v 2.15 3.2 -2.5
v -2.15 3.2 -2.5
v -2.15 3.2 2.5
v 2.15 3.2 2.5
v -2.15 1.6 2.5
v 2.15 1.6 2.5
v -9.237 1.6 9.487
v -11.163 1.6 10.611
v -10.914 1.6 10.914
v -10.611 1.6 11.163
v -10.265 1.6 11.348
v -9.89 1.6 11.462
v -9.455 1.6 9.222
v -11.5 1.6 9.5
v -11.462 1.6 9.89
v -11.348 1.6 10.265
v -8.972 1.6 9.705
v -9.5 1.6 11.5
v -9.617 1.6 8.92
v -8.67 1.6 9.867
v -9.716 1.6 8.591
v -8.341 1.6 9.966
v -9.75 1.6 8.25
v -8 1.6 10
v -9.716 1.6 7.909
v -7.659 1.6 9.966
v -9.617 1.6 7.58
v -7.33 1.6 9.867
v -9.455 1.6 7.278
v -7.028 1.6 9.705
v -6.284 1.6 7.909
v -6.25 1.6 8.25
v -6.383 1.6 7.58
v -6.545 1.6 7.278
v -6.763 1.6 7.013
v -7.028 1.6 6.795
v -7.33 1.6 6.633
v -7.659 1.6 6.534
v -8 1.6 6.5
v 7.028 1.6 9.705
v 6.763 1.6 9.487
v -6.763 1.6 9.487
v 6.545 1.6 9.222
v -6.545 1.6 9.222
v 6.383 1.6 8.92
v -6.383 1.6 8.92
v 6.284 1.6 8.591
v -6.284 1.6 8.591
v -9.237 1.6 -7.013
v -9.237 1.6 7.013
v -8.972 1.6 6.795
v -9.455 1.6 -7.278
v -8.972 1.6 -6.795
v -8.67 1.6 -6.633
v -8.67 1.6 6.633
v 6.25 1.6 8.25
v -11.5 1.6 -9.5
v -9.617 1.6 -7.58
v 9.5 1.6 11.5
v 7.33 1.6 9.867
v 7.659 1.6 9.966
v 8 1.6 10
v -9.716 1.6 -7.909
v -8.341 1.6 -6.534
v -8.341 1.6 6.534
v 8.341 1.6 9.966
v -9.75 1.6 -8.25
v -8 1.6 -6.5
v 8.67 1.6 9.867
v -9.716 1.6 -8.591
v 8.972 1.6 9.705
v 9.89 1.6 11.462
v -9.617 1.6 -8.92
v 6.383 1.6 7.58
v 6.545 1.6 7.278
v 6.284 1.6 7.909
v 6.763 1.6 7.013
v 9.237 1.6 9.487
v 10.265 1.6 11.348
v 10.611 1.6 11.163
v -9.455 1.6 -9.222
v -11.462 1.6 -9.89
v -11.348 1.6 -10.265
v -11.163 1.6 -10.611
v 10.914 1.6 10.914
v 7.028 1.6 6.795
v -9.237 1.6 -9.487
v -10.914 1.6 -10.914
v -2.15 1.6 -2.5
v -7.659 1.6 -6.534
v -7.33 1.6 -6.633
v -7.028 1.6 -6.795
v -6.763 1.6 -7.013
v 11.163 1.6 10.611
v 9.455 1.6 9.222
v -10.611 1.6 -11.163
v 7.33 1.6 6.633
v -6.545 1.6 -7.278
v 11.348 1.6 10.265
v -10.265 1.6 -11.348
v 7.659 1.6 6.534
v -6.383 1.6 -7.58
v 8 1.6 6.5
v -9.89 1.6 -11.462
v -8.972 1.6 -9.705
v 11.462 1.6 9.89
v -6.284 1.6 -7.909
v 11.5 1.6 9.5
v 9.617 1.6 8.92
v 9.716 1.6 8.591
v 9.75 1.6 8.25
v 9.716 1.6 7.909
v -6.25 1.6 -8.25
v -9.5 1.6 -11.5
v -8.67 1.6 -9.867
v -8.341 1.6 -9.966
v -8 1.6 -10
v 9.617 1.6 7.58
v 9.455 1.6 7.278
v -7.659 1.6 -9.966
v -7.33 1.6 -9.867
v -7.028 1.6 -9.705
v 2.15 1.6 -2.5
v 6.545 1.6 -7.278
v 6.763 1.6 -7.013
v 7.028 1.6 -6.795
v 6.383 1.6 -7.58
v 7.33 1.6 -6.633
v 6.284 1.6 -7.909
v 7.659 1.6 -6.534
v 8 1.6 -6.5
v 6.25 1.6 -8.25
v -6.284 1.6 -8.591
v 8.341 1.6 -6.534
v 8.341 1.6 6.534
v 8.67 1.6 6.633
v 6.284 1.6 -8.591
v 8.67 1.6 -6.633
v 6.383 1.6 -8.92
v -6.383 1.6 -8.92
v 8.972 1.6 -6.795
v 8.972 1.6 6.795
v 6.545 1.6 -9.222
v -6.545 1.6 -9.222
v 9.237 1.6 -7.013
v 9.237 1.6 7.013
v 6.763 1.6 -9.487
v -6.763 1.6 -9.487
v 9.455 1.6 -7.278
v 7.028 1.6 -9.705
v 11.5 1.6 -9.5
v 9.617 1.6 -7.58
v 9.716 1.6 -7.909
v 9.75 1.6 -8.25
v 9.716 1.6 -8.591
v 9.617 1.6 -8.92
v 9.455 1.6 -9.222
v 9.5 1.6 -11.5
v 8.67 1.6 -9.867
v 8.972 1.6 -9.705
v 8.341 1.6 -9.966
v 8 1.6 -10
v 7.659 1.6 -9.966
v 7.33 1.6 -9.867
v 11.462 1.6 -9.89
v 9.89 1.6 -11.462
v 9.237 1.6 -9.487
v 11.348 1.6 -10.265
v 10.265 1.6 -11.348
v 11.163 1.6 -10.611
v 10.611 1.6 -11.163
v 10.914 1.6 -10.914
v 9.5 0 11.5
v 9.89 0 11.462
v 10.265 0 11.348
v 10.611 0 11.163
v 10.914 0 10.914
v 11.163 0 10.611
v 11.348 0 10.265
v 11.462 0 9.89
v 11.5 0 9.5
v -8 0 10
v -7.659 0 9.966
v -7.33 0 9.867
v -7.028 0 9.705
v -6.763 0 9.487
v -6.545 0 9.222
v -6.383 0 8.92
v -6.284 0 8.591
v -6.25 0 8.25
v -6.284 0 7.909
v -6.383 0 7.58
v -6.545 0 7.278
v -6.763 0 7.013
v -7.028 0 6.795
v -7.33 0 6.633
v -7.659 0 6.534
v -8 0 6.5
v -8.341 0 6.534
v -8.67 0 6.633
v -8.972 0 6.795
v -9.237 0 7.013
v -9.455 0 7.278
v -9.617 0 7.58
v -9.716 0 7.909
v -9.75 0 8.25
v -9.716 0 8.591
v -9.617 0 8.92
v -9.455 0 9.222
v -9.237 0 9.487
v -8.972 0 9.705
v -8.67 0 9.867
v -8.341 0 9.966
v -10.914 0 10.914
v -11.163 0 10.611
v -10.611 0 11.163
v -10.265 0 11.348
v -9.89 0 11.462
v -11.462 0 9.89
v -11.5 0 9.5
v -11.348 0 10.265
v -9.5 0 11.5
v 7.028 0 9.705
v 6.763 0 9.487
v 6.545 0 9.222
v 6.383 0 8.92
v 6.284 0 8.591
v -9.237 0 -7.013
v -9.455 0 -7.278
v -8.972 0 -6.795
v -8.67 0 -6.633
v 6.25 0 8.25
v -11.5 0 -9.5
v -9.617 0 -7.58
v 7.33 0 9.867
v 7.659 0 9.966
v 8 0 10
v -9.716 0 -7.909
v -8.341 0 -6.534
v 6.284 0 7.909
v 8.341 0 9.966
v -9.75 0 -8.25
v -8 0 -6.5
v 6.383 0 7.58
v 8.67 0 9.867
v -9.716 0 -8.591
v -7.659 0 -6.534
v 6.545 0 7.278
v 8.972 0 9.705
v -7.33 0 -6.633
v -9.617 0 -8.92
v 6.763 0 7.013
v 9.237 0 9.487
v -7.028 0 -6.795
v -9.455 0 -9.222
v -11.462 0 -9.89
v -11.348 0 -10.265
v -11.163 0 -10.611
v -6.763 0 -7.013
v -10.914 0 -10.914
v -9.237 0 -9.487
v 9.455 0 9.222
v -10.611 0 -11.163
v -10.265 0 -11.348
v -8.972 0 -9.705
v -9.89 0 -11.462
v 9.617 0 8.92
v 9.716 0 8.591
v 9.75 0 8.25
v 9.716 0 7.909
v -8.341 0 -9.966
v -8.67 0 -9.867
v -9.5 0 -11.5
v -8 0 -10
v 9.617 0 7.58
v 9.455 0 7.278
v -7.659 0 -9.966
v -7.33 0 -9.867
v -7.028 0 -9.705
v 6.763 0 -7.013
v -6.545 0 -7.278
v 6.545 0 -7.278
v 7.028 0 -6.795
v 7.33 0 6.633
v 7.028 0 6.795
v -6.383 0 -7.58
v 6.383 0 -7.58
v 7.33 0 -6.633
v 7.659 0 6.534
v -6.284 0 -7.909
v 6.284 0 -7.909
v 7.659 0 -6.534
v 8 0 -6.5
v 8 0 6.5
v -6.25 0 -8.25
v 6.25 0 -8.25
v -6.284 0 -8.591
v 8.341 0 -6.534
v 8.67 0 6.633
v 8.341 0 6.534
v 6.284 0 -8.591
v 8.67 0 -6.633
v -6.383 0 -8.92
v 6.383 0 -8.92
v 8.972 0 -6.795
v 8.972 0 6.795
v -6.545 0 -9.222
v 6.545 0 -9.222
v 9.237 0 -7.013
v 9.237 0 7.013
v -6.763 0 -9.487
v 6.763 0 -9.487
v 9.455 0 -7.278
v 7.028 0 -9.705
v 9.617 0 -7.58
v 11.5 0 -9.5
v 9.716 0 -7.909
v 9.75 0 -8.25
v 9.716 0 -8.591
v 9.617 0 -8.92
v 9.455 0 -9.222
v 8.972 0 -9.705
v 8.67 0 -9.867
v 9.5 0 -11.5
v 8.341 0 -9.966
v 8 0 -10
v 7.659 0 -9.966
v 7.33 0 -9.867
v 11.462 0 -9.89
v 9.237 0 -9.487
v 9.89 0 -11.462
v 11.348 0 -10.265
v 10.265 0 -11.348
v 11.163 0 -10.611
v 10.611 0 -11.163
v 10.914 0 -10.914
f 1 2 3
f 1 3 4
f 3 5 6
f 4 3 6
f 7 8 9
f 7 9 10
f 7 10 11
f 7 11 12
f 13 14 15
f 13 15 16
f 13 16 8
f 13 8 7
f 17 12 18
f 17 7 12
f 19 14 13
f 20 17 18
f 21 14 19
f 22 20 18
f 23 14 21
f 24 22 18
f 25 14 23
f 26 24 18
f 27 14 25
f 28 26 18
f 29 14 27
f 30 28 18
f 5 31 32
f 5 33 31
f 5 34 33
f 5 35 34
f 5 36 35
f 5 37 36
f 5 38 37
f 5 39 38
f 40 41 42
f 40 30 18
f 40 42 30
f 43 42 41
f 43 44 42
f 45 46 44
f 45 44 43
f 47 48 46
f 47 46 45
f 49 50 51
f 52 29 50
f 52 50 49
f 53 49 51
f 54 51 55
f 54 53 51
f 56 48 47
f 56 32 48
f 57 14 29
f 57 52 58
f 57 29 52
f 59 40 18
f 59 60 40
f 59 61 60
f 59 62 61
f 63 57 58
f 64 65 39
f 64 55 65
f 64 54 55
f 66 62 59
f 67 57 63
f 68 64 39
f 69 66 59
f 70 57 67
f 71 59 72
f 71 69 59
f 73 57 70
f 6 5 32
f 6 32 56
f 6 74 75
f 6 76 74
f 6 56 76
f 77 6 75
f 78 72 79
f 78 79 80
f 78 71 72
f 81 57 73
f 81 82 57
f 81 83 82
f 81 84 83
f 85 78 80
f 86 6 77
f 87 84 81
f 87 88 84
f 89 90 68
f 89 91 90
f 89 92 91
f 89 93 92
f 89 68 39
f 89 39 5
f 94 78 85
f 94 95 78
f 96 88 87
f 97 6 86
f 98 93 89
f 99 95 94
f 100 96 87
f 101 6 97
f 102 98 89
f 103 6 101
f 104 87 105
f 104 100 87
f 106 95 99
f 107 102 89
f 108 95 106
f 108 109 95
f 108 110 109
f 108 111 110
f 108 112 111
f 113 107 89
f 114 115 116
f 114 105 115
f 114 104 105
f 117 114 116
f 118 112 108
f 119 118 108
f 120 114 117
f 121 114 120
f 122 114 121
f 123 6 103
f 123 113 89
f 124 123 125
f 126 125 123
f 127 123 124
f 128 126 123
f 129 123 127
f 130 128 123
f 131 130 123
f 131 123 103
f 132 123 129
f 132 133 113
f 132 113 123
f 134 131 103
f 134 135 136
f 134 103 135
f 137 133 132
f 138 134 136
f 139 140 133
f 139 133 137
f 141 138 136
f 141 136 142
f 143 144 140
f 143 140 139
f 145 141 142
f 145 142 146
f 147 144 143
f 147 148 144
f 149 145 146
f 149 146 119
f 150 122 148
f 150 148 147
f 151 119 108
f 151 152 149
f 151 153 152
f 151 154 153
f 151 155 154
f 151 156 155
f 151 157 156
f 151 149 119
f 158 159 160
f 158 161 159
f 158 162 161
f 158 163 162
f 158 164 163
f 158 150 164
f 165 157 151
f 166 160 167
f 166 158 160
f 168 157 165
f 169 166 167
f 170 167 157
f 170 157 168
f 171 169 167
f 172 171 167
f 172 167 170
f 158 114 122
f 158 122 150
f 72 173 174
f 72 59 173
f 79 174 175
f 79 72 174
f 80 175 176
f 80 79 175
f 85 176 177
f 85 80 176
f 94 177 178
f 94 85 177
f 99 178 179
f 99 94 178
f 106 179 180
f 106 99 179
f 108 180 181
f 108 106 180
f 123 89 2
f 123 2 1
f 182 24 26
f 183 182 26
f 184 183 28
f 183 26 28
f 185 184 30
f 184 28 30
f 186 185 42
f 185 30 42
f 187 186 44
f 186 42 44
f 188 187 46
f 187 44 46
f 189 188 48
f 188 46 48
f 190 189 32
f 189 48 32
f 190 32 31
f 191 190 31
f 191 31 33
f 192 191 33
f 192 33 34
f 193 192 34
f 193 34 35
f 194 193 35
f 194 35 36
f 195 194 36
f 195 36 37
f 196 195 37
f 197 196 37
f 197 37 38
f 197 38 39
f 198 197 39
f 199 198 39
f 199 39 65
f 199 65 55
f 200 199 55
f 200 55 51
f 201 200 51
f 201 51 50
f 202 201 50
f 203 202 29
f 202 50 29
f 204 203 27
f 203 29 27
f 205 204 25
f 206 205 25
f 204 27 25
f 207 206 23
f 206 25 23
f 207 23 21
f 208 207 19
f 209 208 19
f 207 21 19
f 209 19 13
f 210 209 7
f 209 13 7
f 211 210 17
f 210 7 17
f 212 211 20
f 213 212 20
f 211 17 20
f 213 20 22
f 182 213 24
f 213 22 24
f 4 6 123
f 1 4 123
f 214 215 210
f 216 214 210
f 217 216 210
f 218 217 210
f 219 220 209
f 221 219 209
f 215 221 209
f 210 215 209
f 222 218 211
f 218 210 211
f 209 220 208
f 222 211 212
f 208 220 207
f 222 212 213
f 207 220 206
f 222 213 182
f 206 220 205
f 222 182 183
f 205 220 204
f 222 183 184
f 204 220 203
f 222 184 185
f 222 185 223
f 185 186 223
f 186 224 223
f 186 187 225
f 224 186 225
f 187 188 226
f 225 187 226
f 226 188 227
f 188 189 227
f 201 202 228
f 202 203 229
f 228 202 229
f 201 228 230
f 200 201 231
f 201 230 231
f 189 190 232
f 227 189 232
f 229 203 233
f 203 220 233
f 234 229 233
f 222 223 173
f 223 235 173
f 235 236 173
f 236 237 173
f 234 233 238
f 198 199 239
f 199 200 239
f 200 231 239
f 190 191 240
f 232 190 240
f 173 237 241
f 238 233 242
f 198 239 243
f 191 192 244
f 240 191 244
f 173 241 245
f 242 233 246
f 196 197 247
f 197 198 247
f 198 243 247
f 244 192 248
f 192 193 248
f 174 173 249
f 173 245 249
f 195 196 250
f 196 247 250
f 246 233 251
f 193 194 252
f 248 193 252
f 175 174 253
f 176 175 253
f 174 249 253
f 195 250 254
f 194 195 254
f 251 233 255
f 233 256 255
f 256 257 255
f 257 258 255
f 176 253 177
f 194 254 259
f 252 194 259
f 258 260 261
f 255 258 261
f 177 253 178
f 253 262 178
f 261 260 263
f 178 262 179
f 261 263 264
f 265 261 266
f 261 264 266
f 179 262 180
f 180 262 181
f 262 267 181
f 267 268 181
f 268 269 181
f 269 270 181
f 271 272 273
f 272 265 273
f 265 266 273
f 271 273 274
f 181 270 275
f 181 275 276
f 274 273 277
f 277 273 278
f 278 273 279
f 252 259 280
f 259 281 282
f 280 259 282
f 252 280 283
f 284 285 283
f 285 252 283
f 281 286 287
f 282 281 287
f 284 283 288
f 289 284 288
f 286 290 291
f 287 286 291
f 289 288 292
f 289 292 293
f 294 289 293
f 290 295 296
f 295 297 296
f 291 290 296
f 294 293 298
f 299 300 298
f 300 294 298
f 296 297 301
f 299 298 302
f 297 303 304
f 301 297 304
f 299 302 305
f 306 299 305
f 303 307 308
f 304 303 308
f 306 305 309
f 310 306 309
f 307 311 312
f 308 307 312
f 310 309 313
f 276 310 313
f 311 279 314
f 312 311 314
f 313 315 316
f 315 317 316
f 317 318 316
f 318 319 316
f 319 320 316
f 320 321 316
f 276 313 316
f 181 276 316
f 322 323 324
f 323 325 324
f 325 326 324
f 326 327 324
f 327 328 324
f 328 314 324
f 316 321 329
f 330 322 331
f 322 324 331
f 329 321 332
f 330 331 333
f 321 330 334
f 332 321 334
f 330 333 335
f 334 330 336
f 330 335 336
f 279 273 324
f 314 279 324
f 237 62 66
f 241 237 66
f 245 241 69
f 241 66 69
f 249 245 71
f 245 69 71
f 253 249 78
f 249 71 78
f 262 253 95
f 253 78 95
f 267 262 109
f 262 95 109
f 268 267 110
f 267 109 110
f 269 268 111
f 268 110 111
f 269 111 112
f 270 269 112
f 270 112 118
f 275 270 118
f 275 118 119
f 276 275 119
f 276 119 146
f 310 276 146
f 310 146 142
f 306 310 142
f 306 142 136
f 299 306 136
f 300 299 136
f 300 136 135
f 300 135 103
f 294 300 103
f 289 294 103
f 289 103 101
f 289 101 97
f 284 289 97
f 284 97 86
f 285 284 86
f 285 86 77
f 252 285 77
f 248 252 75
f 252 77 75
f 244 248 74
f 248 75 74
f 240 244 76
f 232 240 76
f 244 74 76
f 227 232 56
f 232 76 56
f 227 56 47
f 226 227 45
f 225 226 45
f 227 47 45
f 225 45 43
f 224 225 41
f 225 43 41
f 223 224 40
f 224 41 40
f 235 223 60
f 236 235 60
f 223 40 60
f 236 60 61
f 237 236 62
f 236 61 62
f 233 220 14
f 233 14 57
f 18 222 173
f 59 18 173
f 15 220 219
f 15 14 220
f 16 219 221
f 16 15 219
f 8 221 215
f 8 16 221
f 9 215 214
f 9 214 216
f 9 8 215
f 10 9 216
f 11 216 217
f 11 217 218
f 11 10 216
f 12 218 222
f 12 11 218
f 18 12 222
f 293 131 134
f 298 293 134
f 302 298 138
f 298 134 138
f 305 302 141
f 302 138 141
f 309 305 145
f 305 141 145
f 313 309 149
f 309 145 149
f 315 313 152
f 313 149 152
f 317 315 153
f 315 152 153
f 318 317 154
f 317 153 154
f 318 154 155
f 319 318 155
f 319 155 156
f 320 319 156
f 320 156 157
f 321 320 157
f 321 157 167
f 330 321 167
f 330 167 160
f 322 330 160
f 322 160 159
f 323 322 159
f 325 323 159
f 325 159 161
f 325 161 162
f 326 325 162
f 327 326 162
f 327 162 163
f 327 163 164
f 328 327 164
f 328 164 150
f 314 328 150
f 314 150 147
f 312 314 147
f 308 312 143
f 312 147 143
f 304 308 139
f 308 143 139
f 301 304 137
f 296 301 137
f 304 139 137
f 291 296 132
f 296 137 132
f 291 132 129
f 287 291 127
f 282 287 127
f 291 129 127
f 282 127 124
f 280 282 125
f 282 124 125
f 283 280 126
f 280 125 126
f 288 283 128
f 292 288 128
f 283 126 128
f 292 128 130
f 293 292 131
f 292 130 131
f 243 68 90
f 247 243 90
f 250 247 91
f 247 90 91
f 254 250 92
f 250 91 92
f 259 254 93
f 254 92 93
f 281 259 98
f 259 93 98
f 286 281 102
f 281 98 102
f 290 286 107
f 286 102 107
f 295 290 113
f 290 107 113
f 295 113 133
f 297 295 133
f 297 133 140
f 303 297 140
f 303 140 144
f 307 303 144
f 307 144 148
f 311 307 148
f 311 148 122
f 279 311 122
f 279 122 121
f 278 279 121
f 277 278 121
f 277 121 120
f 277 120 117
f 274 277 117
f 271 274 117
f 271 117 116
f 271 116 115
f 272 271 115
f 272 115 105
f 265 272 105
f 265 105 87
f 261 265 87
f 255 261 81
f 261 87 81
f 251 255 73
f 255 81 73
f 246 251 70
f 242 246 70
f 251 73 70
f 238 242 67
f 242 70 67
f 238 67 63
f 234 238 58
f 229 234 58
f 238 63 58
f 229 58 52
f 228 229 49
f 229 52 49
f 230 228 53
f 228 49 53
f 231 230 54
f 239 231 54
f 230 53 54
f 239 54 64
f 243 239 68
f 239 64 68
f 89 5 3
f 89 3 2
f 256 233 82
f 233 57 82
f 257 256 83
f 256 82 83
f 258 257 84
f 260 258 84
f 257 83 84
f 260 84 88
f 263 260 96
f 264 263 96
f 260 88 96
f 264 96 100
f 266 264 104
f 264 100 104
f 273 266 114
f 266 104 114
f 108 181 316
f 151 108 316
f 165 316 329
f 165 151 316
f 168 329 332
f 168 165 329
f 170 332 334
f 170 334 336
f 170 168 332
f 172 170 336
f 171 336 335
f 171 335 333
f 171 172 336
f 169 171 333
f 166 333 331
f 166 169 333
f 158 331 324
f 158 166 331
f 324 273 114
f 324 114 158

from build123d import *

# Parameters (mm, degrees)
SKETCH1_W           = 23
SKETCH1_H           = 23
BOSS_EXTRUDE1_DEPTH = 1.6
FILLET1_R           = 2
CUT_EXTRUDE1_REACH  = 18.342
SKETCH2_R           = 1.75
SKETCH3_W           = 4.3
SKETCH3_H           = 5
BOSS_EXTRUDE2_DEPTH = 1.6


with BuildPart() as part:
    # Sketch1 → Boss-Extrude1 (new body)
    with BuildSketch(Plane(origin=(0, 0, 0), x_dir=(1, 0, 0), z_dir=(0, 1, 0))):
        Rectangle(SKETCH1_W, SKETCH1_H)
    extrude(amount=BOSS_EXTRUDE1_DEPTH)

    # Fillet1
    fillet1_edges = [part.edges().sort_by_distance(p)[0] for p in [
        (11.5, 0.8, 11.5),
        (-11.5, 0.8, 11.5),
        (-11.5, 0.8, -11.5),
        (11.5, 0.8, -11.5),
    ]]
    fillet(fillet1_edges, radius=FILLET1_R)

    # Sketch2 → Cut-Extrude1 (cut, up to next)
    with BuildSketch(Plane(origin=(0, 1.6, 0), x_dir=(1, 0, 0), z_dir=(0, 1, 0)), mode=Mode.PRIVATE) as cut_extrude1_sk1:
        with Locations(Location((-8, 8.25, 0), (0, 0, 270))):
            Circle(SKETCH2_R)
    cut_extrude1_tool1 = extrude(cut_extrude1_sk1.sketch, amount=-CUT_EXTRUDE1_REACH, mode=Mode.PRIVATE) & part.part
    # Sketch2 → Cut-Extrude1 (cut, up to next)
    with BuildSketch(Plane(origin=(0, 1.6, 0), x_dir=(1, 0, 0), z_dir=(0, 1, 0)), mode=Mode.PRIVATE) as cut_extrude1_sk2:
        with Locations(Location((8, 8.25, 0), (0, 0, 270))):
            Circle(SKETCH2_R)
    cut_extrude1_tool2 = extrude(cut_extrude1_sk2.sketch, amount=-CUT_EXTRUDE1_REACH, mode=Mode.PRIVATE) & part.part
    # Sketch2 → Cut-Extrude1 (cut, up to next)
    with BuildSketch(Plane(origin=(0, 1.6, 0), x_dir=(1, 0, 0), z_dir=(0, 1, 0)), mode=Mode.PRIVATE) as cut_extrude1_sk3:
        with Locations(Location((8, -8.25, 0), (0, 0, 270))):
            Circle(SKETCH2_R)
    cut_extrude1_tool3 = extrude(cut_extrude1_sk3.sketch, amount=-CUT_EXTRUDE1_REACH, mode=Mode.PRIVATE) & part.part
    # Sketch2 → Cut-Extrude1 (cut, up to next)
    with BuildSketch(Plane(origin=(0, 1.6, 0), x_dir=(1, 0, 0), z_dir=(0, 1, 0)), mode=Mode.PRIVATE) as cut_extrude1_sk4:
        with Locations(Location((-8, -8.25, 0), (0, 0, 270))):
            Circle(SKETCH2_R)
    cut_extrude1_tool4 = extrude(cut_extrude1_sk4.sketch, amount=-CUT_EXTRUDE1_REACH, mode=Mode.PRIVATE) & part.part
    add(cut_extrude1_tool1.solids().sort_by_distance((-8, 1.6, -8.25))[0], mode=Mode.SUBTRACT)
    add(cut_extrude1_tool2.solids().sort_by_distance((8, 1.6, -8.25))[0], mode=Mode.SUBTRACT)
    add(cut_extrude1_tool3.solids().sort_by_distance((8, 1.6, 8.25))[0], mode=Mode.SUBTRACT)
    add(cut_extrude1_tool4.solids().sort_by_distance((-8, 1.6, 8.25))[0], mode=Mode.SUBTRACT)

    # Sketch3 → Boss-Extrude2 (add)
    with BuildSketch(Plane(origin=(0, 1.6, 0), x_dir=(1, 0, 0), z_dir=(0, 1, 0))):
        Rectangle(SKETCH3_W, SKETCH3_H)
    extrude(amount=BOSS_EXTRUDE2_DEPTH)


solid = part.part
